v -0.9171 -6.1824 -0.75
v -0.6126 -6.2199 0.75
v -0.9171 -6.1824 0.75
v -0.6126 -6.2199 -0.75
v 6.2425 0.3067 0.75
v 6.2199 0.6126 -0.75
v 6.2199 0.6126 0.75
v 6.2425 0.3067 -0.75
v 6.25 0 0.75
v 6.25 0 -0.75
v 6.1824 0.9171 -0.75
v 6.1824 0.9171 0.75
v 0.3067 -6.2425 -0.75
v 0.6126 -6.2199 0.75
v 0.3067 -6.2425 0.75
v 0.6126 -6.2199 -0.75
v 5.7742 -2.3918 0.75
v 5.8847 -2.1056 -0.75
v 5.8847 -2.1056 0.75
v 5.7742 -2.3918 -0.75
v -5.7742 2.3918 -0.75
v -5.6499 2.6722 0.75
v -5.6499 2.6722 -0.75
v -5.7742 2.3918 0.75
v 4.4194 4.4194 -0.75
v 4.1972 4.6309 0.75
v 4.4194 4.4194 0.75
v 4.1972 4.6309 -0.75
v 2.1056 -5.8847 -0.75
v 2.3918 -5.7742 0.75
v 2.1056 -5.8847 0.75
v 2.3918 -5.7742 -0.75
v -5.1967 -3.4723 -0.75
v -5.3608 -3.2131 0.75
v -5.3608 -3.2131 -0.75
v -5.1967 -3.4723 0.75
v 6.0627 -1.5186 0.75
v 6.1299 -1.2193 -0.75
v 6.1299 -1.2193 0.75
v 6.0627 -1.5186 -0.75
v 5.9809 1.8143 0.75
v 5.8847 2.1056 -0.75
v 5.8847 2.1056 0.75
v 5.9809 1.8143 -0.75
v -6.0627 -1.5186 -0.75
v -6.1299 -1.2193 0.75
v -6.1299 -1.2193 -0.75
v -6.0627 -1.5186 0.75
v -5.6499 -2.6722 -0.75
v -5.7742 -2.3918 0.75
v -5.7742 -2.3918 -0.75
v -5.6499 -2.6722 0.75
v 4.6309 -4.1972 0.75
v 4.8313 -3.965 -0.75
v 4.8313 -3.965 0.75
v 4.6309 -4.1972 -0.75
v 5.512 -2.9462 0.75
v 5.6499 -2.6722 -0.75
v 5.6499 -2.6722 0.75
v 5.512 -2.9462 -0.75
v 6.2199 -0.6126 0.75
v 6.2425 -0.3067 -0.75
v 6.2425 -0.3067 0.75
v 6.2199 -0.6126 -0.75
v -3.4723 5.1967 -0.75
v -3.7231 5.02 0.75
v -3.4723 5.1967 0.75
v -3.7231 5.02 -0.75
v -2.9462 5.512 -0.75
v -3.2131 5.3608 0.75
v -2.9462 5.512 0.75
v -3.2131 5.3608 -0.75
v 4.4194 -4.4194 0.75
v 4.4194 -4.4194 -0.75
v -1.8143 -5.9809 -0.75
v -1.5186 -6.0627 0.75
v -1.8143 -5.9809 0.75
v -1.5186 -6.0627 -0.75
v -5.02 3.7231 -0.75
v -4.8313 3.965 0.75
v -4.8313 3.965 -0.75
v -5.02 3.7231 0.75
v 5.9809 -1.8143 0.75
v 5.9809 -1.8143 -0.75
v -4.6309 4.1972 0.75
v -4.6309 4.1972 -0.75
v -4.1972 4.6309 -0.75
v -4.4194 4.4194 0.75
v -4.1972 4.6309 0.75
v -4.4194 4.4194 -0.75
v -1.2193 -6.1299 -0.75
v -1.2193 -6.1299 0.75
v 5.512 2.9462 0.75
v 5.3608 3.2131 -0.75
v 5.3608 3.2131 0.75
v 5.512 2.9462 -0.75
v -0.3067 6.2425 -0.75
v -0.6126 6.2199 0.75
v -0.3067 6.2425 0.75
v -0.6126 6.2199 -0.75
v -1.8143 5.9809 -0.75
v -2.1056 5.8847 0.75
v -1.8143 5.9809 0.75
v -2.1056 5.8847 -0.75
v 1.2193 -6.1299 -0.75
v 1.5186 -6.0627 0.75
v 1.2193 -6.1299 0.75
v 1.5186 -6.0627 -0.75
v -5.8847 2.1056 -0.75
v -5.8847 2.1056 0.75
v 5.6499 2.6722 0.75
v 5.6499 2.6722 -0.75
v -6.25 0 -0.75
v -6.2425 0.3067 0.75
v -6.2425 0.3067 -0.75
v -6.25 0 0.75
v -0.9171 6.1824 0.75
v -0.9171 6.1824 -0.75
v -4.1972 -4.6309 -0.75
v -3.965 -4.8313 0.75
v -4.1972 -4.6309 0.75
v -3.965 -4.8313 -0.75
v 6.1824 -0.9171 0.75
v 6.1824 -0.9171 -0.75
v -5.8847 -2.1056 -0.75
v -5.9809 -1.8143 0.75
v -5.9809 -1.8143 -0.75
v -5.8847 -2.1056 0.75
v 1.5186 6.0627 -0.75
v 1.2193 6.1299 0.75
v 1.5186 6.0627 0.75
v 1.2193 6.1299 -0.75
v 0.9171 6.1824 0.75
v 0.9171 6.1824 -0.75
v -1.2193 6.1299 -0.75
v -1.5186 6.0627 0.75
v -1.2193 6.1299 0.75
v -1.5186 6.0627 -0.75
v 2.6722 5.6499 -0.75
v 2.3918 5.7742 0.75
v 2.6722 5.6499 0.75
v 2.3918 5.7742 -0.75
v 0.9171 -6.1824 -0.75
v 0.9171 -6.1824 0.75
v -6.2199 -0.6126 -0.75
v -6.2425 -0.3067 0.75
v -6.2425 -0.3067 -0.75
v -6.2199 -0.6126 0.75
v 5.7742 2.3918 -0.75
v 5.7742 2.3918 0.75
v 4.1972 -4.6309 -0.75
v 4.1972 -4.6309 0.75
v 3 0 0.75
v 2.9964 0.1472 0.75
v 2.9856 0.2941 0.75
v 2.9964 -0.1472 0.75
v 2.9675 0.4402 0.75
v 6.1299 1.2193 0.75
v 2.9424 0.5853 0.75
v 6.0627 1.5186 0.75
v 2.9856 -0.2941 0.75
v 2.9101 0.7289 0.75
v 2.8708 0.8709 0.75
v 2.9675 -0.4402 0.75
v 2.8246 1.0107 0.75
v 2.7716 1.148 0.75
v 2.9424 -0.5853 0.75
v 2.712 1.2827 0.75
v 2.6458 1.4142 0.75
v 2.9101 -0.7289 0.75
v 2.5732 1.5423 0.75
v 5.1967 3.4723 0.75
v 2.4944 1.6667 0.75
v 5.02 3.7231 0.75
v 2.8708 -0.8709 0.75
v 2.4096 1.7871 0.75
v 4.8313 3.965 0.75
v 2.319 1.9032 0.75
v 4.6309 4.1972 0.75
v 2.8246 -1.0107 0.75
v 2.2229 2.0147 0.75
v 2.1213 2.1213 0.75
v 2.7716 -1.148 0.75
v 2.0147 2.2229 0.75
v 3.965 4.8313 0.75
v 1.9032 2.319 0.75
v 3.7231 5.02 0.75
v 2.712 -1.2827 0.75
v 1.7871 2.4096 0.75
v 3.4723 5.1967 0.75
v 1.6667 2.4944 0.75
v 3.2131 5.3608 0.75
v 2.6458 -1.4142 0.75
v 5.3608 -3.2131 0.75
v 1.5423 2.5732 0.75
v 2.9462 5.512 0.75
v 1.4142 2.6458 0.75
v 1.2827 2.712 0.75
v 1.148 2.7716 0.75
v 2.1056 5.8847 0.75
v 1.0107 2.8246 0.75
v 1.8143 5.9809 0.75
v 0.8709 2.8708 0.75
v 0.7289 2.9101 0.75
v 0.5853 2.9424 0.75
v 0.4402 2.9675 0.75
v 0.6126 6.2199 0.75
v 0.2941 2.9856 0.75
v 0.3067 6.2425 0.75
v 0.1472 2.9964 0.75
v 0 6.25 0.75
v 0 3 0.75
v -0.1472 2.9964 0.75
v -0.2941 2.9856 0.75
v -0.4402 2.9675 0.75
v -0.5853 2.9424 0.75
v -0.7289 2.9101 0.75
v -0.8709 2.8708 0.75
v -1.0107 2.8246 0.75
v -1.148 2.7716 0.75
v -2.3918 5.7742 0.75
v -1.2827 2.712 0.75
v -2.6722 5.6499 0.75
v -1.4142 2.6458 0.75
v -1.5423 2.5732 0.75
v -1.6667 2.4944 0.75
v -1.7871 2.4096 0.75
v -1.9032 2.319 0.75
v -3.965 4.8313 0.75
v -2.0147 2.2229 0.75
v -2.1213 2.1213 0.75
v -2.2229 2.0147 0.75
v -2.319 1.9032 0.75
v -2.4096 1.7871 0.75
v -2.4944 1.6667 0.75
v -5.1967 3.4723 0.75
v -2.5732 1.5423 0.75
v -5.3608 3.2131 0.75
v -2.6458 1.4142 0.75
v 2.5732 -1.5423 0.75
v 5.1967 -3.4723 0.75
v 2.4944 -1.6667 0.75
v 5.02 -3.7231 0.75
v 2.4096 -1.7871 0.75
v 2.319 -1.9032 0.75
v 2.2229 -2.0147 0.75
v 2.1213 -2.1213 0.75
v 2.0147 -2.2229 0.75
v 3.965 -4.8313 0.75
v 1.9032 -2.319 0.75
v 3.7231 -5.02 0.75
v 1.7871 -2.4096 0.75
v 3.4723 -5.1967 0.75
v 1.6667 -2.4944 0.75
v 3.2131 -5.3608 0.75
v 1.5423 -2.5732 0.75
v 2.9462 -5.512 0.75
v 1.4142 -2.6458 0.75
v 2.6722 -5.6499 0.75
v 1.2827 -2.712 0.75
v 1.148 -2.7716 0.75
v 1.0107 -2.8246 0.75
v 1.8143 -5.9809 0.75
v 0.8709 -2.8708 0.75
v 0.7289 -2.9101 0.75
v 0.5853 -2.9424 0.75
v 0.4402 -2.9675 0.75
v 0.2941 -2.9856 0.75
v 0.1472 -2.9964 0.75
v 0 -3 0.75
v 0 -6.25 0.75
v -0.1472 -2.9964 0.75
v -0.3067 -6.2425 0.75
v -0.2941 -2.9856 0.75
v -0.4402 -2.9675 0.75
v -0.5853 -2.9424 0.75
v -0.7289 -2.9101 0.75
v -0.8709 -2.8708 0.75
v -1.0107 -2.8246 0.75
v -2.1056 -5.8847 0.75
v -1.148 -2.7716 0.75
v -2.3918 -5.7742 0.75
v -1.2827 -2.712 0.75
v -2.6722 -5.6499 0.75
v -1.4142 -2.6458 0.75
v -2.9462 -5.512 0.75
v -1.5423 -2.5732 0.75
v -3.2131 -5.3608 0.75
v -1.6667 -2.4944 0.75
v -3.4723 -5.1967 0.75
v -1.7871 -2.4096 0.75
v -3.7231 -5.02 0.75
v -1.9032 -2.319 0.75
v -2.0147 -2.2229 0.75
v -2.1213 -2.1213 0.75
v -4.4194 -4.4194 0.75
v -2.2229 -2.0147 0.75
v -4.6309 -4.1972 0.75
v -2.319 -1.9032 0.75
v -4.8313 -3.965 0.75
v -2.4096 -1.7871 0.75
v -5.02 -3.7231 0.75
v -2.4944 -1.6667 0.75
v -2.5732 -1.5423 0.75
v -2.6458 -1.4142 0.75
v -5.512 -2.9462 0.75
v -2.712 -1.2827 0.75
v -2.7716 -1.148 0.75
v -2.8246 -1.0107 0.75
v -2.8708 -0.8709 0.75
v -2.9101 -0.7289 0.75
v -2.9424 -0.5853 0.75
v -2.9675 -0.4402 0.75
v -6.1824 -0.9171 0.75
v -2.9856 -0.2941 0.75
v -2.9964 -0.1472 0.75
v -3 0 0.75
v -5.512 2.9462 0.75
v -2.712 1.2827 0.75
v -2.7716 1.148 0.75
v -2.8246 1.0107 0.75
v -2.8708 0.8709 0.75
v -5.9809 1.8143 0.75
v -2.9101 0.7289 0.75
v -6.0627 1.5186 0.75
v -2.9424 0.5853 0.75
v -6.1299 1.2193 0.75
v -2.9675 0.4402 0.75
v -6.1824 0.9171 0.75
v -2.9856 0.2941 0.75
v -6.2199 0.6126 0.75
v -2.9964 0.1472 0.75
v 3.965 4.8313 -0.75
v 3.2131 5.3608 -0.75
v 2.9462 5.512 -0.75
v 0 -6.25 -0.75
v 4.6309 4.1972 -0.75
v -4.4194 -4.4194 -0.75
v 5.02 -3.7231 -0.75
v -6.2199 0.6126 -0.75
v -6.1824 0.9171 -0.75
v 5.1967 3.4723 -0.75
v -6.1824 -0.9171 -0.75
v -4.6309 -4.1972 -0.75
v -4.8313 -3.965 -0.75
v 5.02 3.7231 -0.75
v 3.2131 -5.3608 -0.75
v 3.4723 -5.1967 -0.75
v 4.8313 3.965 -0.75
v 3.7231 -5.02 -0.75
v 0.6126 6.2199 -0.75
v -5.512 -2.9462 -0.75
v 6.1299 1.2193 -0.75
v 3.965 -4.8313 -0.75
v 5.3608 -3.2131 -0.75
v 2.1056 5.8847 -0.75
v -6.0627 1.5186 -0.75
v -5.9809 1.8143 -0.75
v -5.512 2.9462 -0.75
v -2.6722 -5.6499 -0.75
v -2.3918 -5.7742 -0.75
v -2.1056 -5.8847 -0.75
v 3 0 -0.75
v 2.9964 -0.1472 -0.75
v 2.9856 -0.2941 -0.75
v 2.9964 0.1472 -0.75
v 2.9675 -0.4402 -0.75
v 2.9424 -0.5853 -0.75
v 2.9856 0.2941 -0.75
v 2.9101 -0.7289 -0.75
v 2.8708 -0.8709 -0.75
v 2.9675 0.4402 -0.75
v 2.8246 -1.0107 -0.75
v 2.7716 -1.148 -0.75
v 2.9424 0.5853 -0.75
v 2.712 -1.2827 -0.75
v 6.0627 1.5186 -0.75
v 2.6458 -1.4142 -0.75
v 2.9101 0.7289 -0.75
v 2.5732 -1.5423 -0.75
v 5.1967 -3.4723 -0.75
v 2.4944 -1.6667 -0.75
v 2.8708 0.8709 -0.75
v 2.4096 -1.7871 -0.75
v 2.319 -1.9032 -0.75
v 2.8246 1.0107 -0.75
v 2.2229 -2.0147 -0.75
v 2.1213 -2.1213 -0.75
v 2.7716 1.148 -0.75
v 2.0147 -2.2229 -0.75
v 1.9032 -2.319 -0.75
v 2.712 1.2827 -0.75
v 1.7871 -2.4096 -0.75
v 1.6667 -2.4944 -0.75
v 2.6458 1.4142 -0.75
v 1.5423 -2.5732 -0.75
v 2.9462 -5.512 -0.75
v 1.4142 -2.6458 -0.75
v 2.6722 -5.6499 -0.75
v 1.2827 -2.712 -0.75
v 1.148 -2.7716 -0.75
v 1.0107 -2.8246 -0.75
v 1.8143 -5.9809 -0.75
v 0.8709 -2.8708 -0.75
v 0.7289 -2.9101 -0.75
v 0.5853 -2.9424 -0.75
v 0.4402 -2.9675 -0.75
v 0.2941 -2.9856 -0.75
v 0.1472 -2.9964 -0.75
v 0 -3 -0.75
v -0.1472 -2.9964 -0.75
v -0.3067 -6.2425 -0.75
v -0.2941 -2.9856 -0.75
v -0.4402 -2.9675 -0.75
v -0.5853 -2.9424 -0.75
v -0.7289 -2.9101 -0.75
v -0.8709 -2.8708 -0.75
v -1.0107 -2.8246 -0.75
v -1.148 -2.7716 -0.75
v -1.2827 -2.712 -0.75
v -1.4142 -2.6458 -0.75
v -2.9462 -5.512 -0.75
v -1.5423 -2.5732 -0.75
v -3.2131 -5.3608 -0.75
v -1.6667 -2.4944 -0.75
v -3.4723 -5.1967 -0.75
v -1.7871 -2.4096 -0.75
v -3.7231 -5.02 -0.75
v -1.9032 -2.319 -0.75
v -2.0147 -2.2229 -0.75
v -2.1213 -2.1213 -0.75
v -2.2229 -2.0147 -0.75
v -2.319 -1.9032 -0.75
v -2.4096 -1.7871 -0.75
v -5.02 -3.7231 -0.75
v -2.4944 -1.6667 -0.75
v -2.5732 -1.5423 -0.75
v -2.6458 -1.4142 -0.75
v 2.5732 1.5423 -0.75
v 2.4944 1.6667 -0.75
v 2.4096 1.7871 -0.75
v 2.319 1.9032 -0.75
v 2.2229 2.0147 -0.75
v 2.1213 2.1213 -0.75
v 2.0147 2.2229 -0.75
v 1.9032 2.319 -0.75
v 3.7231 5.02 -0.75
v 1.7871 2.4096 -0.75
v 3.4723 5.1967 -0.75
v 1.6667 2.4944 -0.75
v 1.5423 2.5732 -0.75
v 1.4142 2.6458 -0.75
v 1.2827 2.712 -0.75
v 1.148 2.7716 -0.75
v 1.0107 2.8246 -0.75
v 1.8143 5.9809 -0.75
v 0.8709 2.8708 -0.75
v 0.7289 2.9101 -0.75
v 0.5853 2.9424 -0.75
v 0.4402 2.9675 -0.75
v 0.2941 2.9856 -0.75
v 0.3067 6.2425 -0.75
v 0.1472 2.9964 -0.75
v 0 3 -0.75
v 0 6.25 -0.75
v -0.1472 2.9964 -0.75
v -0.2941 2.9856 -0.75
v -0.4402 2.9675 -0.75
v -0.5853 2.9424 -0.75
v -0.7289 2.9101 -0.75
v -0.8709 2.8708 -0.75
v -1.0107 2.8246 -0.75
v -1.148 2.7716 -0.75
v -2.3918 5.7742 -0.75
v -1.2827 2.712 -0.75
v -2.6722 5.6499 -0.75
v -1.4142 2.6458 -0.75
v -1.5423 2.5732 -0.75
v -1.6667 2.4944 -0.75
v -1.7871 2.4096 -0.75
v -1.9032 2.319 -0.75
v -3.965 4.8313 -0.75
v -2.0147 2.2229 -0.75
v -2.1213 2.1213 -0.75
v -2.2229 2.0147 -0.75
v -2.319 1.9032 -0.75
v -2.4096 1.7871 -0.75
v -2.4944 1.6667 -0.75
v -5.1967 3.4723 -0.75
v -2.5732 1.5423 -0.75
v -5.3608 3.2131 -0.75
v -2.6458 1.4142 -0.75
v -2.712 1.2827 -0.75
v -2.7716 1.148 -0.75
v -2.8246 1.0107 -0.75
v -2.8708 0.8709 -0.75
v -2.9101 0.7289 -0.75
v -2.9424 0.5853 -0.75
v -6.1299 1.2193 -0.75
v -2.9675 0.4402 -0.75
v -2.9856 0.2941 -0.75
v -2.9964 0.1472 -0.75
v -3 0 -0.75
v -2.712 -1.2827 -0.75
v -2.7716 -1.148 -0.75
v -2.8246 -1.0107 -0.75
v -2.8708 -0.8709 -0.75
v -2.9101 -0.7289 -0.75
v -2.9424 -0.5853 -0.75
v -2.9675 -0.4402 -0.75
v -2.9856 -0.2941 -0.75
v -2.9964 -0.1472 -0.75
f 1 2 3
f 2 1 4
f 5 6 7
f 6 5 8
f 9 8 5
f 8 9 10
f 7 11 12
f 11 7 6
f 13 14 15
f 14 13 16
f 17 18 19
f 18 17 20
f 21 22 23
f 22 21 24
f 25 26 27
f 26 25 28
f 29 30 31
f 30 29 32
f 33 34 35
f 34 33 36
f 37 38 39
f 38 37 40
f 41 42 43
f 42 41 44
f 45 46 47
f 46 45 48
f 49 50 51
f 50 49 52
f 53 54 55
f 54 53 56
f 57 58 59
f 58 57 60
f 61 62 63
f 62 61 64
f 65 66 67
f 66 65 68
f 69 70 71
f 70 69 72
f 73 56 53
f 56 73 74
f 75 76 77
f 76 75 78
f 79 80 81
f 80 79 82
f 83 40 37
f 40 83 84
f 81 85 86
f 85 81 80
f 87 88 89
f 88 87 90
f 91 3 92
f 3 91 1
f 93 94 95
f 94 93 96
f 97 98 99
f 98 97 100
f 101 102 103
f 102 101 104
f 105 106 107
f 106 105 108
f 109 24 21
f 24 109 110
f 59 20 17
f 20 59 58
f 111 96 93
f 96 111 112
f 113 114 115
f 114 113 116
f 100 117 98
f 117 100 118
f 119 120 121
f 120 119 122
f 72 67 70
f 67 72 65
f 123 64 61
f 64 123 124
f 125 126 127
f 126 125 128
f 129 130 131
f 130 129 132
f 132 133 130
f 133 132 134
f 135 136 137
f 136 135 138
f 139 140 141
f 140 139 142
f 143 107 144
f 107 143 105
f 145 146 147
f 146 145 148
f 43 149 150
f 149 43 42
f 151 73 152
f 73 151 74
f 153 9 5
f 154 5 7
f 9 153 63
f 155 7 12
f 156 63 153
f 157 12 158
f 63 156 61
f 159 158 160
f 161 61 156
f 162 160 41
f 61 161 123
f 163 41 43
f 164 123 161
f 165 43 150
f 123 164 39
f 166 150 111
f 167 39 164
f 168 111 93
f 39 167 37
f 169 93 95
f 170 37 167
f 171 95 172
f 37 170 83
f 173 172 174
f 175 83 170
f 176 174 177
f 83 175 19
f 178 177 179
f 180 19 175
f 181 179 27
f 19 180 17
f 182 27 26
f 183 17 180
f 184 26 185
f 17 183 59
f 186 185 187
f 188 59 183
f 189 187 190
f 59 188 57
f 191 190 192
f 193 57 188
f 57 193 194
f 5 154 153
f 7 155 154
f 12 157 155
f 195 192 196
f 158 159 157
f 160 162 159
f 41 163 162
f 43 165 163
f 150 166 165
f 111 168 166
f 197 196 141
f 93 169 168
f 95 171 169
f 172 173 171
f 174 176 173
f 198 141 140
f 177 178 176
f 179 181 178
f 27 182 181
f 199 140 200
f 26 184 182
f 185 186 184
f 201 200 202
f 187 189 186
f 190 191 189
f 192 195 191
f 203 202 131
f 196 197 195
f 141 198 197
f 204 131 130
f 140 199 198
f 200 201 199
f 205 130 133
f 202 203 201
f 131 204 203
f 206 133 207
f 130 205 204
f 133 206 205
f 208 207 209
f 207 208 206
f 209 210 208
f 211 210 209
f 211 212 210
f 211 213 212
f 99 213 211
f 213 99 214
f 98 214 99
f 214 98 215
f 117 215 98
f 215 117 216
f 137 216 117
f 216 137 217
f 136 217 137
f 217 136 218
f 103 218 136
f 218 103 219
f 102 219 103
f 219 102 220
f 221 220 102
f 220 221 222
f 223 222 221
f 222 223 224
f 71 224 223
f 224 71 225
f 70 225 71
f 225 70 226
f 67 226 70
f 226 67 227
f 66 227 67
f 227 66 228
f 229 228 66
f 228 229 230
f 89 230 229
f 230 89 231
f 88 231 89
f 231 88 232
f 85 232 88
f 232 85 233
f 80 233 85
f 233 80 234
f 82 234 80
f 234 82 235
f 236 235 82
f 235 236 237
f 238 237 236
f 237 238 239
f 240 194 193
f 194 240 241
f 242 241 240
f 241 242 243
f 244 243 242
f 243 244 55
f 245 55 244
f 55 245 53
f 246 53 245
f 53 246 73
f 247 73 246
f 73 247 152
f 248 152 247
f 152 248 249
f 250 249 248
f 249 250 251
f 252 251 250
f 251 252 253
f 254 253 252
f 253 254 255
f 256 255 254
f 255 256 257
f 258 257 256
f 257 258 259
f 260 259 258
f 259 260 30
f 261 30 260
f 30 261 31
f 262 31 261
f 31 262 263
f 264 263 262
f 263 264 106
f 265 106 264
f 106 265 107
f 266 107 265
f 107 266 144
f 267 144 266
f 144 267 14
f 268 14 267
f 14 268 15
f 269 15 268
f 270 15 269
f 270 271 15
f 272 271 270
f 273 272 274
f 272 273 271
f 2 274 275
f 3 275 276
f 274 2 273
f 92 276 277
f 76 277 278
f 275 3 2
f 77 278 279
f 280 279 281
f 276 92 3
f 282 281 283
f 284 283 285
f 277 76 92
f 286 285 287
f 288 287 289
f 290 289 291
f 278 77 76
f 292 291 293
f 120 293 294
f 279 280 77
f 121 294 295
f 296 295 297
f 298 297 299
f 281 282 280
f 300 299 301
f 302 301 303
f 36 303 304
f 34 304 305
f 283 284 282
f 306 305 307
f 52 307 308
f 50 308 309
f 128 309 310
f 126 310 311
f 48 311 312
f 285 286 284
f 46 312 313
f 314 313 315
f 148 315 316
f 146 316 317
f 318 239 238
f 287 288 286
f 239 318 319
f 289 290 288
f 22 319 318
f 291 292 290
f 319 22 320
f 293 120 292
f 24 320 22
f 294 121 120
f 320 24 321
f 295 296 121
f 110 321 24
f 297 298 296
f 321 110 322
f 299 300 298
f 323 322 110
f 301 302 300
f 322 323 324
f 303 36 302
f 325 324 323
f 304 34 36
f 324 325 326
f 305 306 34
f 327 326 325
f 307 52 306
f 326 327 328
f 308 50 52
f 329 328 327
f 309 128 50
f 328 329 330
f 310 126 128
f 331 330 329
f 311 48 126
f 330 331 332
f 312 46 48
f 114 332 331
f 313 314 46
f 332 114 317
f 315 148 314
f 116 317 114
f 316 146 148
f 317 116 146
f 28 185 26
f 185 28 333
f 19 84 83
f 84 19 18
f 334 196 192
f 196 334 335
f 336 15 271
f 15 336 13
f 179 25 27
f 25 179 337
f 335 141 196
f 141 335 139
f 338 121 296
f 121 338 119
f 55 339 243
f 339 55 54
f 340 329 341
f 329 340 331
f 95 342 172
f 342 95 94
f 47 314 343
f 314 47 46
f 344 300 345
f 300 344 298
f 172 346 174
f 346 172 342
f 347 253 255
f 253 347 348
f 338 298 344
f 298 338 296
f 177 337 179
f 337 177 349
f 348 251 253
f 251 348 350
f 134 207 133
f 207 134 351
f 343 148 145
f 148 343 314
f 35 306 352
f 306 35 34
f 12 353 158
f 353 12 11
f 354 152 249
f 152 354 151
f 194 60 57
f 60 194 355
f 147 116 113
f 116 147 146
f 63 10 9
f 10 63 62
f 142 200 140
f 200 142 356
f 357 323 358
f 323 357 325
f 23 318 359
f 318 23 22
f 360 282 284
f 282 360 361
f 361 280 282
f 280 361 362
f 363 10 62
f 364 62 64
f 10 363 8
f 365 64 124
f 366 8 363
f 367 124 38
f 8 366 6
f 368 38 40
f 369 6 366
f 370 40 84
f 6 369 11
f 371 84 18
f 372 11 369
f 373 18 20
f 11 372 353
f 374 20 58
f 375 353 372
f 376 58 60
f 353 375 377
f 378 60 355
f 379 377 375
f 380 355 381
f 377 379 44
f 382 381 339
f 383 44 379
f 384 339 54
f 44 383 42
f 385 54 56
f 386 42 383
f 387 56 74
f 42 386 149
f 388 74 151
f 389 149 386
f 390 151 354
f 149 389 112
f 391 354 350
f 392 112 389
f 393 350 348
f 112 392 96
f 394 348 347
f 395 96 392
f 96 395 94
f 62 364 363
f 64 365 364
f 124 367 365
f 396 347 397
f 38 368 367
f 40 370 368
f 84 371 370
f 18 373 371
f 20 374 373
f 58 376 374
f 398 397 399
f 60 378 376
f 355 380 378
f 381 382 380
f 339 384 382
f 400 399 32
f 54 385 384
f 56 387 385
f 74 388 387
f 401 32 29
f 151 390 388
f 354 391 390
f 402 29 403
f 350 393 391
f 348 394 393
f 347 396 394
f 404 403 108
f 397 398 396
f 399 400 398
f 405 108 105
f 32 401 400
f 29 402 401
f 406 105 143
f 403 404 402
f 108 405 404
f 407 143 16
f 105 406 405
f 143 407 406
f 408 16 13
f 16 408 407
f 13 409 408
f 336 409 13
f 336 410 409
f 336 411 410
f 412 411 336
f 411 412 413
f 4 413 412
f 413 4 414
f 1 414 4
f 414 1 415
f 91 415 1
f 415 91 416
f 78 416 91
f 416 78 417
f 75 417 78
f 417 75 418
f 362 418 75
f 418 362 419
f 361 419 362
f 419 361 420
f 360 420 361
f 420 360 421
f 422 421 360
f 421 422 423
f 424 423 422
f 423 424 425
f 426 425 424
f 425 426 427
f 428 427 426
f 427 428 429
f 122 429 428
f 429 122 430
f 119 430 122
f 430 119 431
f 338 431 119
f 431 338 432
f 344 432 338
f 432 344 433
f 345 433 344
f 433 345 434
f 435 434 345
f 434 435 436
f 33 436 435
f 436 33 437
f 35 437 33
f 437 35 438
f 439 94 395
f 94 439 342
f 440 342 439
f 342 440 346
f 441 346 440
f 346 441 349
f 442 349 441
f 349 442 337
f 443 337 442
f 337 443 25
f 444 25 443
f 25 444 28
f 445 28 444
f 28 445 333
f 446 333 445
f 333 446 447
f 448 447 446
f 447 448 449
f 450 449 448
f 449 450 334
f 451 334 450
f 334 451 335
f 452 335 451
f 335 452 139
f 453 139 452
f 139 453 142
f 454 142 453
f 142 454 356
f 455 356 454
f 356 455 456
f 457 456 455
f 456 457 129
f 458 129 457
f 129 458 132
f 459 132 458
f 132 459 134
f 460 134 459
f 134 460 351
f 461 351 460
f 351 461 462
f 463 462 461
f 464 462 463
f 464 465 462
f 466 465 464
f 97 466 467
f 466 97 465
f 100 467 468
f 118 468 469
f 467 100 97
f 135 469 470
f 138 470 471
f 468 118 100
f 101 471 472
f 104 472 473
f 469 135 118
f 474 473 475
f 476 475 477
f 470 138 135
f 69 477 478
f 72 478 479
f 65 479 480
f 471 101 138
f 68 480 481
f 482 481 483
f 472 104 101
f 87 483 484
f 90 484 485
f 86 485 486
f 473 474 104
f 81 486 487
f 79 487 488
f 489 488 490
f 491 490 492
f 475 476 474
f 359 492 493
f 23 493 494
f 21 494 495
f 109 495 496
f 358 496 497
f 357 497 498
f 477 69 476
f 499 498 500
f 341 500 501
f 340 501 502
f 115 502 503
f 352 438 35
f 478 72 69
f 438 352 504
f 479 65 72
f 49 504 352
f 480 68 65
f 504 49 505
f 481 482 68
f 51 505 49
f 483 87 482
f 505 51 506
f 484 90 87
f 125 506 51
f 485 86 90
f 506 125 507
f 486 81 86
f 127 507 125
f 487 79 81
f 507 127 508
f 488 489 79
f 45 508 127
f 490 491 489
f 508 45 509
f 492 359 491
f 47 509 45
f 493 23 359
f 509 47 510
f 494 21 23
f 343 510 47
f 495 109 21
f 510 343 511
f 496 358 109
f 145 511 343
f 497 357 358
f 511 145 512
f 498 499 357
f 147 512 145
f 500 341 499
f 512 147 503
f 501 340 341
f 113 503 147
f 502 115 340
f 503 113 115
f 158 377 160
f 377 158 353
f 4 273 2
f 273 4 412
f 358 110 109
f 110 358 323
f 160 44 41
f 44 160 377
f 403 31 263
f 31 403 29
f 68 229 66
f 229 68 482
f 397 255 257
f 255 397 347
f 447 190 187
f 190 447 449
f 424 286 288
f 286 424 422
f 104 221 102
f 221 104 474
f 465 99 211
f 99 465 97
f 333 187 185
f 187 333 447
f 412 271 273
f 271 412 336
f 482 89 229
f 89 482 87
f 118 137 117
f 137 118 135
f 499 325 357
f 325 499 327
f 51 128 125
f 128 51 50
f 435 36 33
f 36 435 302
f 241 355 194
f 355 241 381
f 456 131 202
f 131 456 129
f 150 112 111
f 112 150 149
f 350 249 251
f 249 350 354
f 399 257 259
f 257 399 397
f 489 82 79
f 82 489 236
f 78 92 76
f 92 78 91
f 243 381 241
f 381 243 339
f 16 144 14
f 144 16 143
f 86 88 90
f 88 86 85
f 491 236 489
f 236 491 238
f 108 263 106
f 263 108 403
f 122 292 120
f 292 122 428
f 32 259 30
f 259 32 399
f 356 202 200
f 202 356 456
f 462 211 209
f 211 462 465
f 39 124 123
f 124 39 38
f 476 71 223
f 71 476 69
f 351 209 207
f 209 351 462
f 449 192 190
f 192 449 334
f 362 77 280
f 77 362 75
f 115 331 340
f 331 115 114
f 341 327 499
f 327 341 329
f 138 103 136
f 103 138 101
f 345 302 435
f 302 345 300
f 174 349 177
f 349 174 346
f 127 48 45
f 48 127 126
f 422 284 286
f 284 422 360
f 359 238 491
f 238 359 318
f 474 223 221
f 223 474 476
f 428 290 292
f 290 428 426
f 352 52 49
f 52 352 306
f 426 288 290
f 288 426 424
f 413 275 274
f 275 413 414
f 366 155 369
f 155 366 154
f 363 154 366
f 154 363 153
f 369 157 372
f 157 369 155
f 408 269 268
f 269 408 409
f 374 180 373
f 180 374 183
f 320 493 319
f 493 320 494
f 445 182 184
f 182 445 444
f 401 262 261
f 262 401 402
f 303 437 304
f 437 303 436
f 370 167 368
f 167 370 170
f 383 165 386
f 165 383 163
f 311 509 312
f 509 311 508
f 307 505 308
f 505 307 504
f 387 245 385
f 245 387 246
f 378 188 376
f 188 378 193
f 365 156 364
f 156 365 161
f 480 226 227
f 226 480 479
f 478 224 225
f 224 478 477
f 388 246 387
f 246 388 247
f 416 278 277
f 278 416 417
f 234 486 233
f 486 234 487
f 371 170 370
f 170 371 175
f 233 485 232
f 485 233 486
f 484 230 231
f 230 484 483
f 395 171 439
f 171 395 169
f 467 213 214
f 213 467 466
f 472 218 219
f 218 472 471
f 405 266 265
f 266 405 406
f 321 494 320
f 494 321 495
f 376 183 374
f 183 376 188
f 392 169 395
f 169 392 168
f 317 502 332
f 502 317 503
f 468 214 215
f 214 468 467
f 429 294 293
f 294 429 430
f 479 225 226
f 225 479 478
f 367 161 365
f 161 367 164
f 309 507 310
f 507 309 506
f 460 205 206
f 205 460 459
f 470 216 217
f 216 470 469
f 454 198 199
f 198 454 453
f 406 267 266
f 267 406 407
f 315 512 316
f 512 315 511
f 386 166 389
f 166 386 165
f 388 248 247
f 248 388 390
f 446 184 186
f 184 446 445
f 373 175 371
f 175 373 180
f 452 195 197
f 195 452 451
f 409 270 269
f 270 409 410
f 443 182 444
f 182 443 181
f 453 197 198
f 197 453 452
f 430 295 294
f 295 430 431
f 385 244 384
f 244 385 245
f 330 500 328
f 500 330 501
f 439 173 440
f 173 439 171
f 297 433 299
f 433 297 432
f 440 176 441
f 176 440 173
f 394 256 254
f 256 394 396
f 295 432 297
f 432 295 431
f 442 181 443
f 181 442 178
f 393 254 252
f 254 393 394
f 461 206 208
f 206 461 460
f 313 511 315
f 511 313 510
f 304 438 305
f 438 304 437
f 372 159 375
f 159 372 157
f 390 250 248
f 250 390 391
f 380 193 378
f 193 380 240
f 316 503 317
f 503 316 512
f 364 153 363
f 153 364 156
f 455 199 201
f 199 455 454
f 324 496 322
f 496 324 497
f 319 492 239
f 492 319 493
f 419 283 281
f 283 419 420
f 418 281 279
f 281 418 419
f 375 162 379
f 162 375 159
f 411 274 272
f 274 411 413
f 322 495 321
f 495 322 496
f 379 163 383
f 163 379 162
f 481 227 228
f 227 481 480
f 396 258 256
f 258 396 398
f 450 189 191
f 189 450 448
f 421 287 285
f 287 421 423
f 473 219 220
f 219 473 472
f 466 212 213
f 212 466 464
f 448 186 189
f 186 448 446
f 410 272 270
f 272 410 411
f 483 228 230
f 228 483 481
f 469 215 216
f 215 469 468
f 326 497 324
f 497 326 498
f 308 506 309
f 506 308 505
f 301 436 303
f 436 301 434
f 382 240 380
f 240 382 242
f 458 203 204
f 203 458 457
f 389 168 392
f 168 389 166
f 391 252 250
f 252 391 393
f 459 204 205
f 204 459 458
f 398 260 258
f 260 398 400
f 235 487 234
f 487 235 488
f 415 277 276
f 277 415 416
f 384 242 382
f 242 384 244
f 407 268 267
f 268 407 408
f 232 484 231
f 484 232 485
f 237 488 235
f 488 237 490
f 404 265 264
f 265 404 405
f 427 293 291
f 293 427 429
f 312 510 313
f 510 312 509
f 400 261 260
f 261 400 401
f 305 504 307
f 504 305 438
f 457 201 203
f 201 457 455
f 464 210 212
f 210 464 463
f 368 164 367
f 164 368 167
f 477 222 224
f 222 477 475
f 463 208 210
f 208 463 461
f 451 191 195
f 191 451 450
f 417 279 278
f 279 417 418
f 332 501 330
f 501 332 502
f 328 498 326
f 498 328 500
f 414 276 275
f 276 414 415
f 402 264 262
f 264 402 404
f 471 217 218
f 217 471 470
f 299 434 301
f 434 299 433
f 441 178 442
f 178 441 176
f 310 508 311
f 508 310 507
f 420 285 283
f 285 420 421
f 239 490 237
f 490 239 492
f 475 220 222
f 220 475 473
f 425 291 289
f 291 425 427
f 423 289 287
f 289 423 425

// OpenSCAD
$fn = 128;

id = 6.0;
od = 12.5;
th = 1.5;
eps = 0.02;

difference() {
    cylinder(h = th, d = od, center = true);
    cylinder(h = th + 2*eps, d = id, center = true);
}
